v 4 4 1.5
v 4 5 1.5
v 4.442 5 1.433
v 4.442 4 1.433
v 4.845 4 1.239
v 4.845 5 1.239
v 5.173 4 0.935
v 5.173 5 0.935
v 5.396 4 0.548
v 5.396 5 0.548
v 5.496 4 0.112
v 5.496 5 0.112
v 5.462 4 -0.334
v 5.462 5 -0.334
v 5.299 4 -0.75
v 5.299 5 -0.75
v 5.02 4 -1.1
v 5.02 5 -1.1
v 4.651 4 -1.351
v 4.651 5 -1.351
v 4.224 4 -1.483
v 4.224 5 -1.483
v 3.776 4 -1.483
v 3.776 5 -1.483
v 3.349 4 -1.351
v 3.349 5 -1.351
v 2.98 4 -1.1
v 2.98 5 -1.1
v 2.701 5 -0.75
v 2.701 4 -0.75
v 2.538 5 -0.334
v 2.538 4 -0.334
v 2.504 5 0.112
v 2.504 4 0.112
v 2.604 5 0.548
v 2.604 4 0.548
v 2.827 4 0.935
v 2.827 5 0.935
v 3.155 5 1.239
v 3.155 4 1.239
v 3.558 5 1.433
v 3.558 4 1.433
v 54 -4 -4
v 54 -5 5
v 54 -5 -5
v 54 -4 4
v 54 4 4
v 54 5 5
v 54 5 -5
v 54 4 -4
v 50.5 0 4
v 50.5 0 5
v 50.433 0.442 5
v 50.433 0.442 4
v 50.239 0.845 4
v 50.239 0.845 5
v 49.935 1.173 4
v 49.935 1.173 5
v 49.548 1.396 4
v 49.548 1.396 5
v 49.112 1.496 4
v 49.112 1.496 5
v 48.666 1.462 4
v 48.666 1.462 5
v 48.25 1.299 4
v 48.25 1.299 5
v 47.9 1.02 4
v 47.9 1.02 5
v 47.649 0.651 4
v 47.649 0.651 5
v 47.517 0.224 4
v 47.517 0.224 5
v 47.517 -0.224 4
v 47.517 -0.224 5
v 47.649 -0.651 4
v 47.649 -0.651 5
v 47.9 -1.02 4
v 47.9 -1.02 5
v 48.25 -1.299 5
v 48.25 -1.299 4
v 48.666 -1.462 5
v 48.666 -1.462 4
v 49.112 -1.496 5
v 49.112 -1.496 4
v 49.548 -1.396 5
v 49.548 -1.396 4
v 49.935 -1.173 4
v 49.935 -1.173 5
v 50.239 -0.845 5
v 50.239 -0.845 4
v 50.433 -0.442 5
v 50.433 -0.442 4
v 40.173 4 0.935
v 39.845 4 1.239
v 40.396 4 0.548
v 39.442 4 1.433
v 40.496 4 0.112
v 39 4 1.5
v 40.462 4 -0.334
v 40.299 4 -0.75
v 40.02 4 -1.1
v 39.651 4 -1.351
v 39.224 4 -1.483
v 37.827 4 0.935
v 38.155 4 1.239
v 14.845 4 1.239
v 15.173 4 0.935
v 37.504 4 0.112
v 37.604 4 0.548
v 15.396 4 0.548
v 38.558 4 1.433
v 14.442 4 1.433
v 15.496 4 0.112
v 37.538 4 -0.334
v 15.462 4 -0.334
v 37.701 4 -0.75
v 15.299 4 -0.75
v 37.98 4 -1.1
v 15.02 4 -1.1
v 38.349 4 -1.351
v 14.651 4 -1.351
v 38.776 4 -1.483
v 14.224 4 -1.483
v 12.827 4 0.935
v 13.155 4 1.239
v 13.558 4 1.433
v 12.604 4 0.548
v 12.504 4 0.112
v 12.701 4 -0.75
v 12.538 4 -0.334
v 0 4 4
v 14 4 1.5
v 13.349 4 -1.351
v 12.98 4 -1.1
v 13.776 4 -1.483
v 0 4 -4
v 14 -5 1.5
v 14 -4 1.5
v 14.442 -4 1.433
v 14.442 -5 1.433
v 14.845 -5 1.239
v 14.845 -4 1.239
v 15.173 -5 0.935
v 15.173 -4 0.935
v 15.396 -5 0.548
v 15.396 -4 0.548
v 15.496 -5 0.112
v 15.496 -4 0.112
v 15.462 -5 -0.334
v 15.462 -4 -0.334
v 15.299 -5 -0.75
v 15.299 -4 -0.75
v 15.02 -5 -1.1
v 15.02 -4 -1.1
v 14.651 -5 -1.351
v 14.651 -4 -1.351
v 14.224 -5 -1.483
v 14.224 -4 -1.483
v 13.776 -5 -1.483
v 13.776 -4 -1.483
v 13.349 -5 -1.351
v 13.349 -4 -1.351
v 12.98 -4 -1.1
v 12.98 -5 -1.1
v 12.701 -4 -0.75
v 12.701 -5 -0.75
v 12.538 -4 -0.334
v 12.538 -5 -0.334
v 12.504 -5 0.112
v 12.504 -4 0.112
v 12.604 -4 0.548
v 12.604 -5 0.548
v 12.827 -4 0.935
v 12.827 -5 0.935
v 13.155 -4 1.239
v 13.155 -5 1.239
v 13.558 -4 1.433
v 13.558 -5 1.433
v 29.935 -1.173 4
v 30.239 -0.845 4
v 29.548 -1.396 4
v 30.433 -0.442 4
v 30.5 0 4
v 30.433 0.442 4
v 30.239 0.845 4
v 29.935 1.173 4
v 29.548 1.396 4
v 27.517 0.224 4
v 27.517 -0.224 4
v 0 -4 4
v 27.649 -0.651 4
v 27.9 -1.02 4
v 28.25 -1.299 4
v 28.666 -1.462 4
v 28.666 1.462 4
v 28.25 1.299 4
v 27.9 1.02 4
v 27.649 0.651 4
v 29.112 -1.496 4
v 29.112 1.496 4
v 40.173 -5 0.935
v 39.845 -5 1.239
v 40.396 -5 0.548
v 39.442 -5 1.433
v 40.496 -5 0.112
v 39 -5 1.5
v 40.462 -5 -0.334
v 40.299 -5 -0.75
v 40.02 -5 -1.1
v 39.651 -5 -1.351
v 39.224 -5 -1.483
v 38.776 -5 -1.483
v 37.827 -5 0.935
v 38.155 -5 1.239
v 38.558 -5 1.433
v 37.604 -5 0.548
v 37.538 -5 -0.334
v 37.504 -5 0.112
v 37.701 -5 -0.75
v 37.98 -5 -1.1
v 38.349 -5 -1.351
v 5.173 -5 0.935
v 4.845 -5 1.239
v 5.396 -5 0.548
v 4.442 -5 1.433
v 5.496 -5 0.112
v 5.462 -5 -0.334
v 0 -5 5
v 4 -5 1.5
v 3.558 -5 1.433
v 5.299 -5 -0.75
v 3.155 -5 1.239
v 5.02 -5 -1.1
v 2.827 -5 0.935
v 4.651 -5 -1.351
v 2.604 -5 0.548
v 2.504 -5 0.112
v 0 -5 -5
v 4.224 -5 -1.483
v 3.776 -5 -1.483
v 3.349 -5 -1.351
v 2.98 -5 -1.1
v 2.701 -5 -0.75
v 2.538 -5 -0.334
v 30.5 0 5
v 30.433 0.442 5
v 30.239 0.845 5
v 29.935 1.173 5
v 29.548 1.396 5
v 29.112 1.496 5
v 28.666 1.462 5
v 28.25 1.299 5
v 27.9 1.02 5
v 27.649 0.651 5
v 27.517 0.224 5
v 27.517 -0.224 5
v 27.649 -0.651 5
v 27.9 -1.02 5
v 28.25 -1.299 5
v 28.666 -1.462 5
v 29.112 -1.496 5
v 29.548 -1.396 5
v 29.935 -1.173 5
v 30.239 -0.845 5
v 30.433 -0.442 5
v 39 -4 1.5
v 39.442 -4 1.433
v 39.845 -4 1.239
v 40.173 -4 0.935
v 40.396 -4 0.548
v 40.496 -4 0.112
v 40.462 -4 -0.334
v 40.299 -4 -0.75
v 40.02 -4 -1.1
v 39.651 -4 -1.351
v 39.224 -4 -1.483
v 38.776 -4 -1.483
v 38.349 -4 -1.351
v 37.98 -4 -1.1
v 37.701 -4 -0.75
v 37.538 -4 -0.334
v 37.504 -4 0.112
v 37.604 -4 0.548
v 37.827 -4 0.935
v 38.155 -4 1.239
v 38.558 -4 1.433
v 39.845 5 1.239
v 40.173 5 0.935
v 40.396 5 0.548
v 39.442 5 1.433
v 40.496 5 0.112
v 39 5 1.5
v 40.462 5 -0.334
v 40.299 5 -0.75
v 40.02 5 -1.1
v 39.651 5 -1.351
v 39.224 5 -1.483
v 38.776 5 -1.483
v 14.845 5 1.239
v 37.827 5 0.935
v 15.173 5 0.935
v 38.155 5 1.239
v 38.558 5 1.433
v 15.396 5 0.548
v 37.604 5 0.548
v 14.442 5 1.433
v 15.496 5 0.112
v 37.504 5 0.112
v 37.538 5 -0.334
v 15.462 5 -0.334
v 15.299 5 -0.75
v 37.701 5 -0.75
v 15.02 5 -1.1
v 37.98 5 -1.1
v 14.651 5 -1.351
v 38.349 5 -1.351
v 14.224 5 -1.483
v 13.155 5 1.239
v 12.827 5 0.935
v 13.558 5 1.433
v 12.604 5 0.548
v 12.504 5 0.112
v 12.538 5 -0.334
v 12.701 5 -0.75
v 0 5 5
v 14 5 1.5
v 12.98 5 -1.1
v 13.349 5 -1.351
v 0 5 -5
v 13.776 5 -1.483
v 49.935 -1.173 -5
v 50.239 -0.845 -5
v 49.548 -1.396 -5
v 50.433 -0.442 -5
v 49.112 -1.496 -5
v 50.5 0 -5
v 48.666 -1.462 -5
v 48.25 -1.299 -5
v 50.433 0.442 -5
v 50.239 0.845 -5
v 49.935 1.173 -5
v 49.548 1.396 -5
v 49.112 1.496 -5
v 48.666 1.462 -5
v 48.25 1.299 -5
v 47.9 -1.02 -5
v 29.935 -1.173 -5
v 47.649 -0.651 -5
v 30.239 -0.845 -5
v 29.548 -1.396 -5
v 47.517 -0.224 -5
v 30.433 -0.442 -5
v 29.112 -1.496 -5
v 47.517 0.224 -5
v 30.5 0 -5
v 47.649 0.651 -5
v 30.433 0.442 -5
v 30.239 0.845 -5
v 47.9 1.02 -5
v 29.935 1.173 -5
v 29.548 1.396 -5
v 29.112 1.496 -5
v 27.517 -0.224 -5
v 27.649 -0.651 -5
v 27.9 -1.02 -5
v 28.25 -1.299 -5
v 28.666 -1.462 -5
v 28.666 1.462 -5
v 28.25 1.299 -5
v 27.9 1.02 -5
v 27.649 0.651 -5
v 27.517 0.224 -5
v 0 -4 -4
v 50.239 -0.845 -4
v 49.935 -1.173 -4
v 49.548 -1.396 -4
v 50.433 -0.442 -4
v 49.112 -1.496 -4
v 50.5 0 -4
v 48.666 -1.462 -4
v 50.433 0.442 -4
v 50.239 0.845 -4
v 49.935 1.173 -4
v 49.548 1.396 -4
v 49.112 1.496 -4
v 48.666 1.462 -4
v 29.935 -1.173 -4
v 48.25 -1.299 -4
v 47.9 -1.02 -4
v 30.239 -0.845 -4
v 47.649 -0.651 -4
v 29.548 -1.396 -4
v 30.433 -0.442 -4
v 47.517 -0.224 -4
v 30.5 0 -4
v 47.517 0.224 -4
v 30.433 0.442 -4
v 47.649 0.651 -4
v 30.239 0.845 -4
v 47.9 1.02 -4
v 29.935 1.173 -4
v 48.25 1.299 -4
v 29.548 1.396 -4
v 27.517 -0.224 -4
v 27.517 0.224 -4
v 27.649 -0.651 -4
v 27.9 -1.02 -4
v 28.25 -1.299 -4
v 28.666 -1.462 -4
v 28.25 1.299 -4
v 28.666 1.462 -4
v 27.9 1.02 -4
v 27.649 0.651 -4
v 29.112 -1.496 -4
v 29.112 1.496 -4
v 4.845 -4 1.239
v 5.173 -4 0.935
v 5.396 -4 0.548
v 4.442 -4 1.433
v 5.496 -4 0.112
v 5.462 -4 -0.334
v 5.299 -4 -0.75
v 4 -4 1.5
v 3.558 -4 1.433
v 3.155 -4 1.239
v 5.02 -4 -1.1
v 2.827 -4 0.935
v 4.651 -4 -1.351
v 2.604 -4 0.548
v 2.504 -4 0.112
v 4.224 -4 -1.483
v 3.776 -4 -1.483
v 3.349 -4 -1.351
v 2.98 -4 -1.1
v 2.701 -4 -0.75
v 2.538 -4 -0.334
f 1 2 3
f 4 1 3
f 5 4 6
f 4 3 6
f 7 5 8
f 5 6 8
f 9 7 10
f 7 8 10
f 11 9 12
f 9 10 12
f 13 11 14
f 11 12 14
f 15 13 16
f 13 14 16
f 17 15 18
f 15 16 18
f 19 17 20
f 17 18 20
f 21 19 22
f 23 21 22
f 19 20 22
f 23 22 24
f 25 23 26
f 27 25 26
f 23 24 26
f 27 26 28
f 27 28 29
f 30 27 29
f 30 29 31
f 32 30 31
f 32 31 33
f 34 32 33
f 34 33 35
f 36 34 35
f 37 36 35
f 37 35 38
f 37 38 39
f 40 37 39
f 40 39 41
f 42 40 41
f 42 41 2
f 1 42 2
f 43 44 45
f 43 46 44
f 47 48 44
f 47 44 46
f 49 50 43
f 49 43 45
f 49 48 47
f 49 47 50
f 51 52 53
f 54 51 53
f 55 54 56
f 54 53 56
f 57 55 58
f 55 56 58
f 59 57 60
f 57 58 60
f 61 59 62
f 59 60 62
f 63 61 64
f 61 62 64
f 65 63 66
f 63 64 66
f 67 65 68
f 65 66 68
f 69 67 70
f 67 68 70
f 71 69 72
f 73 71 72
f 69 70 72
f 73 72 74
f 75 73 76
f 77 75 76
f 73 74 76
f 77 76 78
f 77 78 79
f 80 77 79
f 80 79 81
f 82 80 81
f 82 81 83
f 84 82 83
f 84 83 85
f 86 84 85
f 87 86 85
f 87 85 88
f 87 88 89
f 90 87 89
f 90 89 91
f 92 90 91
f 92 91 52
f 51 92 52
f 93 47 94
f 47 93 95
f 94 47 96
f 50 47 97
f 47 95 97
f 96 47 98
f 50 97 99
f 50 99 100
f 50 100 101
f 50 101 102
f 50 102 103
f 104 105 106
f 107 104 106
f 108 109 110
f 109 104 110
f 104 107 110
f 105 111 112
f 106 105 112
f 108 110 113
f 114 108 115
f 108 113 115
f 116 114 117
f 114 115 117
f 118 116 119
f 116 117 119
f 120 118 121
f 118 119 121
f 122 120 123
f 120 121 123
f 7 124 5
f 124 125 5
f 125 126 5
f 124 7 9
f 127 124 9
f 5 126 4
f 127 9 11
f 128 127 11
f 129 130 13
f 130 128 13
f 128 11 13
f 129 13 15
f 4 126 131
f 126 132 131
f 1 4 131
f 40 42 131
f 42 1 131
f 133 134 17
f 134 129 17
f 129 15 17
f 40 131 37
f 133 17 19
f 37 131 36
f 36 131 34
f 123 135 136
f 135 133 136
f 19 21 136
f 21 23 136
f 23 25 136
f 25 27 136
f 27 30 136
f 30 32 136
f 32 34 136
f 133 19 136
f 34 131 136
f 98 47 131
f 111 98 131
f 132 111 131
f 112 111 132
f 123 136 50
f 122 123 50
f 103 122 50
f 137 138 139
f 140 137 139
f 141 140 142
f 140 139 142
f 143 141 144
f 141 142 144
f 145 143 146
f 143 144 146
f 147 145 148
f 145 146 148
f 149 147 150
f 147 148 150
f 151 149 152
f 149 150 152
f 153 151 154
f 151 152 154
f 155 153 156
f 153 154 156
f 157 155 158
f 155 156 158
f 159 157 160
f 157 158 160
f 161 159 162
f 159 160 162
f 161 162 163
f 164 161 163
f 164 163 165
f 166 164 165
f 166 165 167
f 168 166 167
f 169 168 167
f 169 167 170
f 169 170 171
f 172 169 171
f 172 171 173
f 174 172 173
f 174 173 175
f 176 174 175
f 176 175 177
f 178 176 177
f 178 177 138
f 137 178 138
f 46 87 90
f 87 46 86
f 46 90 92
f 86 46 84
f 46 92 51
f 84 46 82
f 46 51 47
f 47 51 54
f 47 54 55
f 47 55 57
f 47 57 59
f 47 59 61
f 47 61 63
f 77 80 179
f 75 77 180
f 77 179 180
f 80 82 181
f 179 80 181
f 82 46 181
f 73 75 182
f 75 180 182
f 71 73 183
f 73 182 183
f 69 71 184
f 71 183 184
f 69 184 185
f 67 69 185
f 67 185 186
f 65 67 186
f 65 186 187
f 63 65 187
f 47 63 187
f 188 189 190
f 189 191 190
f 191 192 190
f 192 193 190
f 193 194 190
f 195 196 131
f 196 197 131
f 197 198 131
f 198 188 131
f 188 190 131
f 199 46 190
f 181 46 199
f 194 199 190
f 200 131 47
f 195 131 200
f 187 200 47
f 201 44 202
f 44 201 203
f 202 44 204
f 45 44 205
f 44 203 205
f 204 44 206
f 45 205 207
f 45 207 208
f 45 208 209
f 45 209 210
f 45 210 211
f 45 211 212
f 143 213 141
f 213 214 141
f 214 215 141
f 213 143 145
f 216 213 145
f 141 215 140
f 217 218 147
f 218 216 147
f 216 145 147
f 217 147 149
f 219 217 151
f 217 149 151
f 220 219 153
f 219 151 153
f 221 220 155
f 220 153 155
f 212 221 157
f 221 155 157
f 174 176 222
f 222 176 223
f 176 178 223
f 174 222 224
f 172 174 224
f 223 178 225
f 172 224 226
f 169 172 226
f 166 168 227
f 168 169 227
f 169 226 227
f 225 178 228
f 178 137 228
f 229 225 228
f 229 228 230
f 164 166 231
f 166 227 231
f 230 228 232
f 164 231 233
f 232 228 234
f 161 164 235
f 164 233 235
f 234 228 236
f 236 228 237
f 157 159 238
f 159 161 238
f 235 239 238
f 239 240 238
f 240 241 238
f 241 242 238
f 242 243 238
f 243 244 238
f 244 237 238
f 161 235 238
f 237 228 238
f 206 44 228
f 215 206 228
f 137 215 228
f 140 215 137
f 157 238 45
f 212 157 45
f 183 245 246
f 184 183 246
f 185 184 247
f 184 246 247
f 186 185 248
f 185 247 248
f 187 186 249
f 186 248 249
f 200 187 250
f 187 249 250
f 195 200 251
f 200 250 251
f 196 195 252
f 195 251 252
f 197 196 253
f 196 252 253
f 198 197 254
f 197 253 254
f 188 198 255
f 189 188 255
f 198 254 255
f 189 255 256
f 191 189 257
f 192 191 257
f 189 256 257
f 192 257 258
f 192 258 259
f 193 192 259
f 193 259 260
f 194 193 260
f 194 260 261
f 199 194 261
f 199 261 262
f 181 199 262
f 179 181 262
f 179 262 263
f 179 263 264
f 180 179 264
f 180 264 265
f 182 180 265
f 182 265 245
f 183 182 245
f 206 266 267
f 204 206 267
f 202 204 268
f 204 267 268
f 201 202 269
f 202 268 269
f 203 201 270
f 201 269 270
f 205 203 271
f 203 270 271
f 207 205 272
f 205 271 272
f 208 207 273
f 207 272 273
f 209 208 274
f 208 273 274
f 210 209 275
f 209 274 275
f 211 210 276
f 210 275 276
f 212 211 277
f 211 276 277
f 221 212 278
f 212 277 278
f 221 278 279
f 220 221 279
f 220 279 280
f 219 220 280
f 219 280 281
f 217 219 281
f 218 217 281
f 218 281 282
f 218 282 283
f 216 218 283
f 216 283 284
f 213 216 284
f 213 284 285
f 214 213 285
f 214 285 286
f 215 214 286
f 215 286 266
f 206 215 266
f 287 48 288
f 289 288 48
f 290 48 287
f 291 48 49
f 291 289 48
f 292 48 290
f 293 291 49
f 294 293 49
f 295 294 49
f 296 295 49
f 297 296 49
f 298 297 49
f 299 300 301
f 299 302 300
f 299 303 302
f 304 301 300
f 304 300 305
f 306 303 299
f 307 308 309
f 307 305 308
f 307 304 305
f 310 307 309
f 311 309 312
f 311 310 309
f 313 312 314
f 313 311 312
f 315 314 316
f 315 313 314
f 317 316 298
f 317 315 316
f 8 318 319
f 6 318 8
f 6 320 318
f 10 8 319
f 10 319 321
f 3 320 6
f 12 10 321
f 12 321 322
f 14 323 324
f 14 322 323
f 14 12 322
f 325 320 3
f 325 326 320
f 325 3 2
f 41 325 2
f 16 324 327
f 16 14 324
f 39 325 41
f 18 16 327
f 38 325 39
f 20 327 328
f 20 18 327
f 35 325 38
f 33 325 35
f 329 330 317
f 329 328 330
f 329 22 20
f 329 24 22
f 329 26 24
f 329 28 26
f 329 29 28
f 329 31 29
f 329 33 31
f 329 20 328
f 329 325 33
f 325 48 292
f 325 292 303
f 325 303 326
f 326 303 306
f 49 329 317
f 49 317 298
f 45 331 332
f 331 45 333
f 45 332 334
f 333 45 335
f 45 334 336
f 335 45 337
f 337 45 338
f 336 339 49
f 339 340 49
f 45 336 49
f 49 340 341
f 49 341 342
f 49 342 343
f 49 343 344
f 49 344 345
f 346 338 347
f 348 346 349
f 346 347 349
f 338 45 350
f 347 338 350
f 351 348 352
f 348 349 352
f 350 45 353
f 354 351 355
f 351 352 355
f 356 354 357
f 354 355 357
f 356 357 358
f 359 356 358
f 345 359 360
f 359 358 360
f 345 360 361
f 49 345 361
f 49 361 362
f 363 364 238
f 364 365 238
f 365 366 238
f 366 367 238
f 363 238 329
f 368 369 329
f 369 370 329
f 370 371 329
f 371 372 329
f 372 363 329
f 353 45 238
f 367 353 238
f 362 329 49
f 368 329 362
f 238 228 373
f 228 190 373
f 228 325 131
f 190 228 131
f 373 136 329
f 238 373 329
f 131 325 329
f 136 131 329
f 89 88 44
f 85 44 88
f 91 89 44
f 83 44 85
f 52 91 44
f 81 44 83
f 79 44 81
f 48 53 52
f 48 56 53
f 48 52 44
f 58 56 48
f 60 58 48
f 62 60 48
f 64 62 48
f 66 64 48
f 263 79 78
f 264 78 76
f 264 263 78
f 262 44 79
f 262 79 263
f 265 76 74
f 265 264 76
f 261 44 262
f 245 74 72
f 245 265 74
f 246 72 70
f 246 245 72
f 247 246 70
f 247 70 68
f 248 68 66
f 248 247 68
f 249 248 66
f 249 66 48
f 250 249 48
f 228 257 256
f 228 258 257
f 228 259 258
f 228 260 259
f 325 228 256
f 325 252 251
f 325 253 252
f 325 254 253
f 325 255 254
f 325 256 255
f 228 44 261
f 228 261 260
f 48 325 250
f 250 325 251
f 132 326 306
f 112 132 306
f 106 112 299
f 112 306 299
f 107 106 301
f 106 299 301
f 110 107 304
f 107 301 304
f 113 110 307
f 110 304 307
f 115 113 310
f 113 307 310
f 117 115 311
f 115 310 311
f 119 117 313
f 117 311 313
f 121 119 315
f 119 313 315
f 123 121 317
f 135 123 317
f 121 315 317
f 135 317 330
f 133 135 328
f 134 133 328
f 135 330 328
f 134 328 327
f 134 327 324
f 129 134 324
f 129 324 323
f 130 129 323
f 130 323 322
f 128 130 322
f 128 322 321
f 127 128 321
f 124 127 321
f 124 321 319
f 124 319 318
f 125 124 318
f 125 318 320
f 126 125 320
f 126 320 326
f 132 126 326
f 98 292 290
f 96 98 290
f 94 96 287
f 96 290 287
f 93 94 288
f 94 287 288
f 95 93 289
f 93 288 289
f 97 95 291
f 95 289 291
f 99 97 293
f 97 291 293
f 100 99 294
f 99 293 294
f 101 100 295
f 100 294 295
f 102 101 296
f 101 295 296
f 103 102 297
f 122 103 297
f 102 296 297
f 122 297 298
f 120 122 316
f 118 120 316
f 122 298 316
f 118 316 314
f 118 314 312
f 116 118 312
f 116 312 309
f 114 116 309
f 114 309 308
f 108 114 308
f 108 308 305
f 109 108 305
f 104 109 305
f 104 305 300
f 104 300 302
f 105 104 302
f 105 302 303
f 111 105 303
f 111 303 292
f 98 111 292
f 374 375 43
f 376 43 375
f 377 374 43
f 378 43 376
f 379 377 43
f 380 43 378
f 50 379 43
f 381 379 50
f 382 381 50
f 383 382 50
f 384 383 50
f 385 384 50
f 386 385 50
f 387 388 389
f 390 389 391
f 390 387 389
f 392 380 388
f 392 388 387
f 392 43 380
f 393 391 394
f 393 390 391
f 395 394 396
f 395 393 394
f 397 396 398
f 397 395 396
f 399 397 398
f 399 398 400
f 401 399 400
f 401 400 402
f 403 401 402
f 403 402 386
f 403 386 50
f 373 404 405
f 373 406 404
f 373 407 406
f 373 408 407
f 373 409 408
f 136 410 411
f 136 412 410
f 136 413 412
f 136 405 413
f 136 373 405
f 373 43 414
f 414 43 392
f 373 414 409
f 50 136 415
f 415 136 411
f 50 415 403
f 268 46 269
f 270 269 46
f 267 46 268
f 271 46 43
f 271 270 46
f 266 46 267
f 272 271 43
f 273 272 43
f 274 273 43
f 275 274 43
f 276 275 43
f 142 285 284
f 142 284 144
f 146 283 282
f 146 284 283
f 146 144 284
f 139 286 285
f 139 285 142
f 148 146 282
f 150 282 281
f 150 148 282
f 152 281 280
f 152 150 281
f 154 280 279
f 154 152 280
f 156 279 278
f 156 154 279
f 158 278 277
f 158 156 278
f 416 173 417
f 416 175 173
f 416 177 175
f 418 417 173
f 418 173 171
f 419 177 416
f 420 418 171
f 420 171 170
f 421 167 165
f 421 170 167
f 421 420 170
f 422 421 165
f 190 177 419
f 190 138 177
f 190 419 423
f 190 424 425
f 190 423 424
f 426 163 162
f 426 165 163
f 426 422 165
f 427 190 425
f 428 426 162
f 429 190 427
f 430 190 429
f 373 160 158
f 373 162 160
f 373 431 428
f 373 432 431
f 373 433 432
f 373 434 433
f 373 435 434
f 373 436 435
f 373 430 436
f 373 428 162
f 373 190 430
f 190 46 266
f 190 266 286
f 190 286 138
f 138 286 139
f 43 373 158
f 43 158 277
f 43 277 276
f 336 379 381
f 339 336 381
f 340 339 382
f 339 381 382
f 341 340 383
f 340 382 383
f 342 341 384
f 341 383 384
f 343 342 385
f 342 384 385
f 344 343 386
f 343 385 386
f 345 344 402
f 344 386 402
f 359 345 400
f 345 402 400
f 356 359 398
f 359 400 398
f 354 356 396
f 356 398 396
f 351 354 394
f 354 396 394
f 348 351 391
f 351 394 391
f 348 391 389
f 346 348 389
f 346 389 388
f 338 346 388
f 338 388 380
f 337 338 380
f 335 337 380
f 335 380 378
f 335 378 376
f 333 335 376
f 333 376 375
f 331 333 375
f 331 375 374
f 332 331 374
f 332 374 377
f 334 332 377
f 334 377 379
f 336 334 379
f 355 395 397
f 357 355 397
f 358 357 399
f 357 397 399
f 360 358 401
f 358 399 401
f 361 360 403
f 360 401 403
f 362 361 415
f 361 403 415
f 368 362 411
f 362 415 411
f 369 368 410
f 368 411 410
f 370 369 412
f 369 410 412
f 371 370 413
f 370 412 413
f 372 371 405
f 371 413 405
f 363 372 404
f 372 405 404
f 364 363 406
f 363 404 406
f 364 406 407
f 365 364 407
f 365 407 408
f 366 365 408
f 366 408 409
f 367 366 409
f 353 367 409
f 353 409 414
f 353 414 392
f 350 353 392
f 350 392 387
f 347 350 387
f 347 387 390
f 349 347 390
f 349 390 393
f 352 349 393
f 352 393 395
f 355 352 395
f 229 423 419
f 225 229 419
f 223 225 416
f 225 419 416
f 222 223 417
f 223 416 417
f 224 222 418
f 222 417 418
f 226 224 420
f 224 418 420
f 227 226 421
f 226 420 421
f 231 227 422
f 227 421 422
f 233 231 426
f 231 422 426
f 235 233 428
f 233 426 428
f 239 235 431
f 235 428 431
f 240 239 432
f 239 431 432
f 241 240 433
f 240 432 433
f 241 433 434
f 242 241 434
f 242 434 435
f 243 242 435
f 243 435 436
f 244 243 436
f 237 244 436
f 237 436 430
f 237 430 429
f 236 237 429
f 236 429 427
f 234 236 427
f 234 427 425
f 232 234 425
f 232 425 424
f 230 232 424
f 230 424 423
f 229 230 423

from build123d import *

# Parameters (mm, degrees)
SKETCH_1_W          = 10
SKETCH_1_H          = 10
SKETCH_1_W_2        = 8
SKETCH_1_H_2        = 8
EXTRUDE_1_DEPTH     = 54
SKETCH_2_R          = 1.5
CUT_EXTRUDE_1_DEPTH = 56.145262716
SKETCH_3_R          = 1.5
CUT_EXTRUDE_2_DEPTH = 56.145262716


with BuildPart() as part:
    # ｽｹｯﾁ1 → 押し出し-薄板1 (new body)
    with BuildSketch(Plane(origin=(0, 0, 0), x_dir=(0, 0, -1), z_dir=(1, 0, 0))):
        Rectangle(SKETCH_1_W, SKETCH_1_H)
        Rectangle(SKETCH_1_W_2, SKETCH_1_H_2, mode=Mode.SUBTRACT)
    extrude(amount=EXTRUDE_1_DEPTH)

    # ｽｹｯﾁ2 → ｶｯﾄ - 押し出し1 (cut, through all)
    with BuildSketch(Plane(origin=(0, 5, 0), x_dir=(1, 0, 0), z_dir=(0, 1, 0))):
        with Locations(Location((4, 0, 0), (0, 0, 270))):
            Circle(SKETCH_2_R)
        with Locations(Location((14, 0, 0), (0, 0, 270))):
            Circle(SKETCH_2_R)
        with Locations(Location((39, 0, 0), (0, 0, 270))):
            Circle(SKETCH_2_R)
    extrude(amount=-CUT_EXTRUDE_1_DEPTH, mode=Mode.SUBTRACT)

    # ｽｹｯﾁ3 → ｶｯﾄ - 押し出し2 (cut, through all)
    with BuildSketch(Plane.XY.offset(5)):
        with Locations((49, 0)):
            Circle(SKETCH_3_R)
        with Locations((29, 0)):
            Circle(SKETCH_3_R)
    extrude(amount=-CUT_EXTRUDE_2_DEPTH, mode=Mode.SUBTRACT)


solid = part.part
